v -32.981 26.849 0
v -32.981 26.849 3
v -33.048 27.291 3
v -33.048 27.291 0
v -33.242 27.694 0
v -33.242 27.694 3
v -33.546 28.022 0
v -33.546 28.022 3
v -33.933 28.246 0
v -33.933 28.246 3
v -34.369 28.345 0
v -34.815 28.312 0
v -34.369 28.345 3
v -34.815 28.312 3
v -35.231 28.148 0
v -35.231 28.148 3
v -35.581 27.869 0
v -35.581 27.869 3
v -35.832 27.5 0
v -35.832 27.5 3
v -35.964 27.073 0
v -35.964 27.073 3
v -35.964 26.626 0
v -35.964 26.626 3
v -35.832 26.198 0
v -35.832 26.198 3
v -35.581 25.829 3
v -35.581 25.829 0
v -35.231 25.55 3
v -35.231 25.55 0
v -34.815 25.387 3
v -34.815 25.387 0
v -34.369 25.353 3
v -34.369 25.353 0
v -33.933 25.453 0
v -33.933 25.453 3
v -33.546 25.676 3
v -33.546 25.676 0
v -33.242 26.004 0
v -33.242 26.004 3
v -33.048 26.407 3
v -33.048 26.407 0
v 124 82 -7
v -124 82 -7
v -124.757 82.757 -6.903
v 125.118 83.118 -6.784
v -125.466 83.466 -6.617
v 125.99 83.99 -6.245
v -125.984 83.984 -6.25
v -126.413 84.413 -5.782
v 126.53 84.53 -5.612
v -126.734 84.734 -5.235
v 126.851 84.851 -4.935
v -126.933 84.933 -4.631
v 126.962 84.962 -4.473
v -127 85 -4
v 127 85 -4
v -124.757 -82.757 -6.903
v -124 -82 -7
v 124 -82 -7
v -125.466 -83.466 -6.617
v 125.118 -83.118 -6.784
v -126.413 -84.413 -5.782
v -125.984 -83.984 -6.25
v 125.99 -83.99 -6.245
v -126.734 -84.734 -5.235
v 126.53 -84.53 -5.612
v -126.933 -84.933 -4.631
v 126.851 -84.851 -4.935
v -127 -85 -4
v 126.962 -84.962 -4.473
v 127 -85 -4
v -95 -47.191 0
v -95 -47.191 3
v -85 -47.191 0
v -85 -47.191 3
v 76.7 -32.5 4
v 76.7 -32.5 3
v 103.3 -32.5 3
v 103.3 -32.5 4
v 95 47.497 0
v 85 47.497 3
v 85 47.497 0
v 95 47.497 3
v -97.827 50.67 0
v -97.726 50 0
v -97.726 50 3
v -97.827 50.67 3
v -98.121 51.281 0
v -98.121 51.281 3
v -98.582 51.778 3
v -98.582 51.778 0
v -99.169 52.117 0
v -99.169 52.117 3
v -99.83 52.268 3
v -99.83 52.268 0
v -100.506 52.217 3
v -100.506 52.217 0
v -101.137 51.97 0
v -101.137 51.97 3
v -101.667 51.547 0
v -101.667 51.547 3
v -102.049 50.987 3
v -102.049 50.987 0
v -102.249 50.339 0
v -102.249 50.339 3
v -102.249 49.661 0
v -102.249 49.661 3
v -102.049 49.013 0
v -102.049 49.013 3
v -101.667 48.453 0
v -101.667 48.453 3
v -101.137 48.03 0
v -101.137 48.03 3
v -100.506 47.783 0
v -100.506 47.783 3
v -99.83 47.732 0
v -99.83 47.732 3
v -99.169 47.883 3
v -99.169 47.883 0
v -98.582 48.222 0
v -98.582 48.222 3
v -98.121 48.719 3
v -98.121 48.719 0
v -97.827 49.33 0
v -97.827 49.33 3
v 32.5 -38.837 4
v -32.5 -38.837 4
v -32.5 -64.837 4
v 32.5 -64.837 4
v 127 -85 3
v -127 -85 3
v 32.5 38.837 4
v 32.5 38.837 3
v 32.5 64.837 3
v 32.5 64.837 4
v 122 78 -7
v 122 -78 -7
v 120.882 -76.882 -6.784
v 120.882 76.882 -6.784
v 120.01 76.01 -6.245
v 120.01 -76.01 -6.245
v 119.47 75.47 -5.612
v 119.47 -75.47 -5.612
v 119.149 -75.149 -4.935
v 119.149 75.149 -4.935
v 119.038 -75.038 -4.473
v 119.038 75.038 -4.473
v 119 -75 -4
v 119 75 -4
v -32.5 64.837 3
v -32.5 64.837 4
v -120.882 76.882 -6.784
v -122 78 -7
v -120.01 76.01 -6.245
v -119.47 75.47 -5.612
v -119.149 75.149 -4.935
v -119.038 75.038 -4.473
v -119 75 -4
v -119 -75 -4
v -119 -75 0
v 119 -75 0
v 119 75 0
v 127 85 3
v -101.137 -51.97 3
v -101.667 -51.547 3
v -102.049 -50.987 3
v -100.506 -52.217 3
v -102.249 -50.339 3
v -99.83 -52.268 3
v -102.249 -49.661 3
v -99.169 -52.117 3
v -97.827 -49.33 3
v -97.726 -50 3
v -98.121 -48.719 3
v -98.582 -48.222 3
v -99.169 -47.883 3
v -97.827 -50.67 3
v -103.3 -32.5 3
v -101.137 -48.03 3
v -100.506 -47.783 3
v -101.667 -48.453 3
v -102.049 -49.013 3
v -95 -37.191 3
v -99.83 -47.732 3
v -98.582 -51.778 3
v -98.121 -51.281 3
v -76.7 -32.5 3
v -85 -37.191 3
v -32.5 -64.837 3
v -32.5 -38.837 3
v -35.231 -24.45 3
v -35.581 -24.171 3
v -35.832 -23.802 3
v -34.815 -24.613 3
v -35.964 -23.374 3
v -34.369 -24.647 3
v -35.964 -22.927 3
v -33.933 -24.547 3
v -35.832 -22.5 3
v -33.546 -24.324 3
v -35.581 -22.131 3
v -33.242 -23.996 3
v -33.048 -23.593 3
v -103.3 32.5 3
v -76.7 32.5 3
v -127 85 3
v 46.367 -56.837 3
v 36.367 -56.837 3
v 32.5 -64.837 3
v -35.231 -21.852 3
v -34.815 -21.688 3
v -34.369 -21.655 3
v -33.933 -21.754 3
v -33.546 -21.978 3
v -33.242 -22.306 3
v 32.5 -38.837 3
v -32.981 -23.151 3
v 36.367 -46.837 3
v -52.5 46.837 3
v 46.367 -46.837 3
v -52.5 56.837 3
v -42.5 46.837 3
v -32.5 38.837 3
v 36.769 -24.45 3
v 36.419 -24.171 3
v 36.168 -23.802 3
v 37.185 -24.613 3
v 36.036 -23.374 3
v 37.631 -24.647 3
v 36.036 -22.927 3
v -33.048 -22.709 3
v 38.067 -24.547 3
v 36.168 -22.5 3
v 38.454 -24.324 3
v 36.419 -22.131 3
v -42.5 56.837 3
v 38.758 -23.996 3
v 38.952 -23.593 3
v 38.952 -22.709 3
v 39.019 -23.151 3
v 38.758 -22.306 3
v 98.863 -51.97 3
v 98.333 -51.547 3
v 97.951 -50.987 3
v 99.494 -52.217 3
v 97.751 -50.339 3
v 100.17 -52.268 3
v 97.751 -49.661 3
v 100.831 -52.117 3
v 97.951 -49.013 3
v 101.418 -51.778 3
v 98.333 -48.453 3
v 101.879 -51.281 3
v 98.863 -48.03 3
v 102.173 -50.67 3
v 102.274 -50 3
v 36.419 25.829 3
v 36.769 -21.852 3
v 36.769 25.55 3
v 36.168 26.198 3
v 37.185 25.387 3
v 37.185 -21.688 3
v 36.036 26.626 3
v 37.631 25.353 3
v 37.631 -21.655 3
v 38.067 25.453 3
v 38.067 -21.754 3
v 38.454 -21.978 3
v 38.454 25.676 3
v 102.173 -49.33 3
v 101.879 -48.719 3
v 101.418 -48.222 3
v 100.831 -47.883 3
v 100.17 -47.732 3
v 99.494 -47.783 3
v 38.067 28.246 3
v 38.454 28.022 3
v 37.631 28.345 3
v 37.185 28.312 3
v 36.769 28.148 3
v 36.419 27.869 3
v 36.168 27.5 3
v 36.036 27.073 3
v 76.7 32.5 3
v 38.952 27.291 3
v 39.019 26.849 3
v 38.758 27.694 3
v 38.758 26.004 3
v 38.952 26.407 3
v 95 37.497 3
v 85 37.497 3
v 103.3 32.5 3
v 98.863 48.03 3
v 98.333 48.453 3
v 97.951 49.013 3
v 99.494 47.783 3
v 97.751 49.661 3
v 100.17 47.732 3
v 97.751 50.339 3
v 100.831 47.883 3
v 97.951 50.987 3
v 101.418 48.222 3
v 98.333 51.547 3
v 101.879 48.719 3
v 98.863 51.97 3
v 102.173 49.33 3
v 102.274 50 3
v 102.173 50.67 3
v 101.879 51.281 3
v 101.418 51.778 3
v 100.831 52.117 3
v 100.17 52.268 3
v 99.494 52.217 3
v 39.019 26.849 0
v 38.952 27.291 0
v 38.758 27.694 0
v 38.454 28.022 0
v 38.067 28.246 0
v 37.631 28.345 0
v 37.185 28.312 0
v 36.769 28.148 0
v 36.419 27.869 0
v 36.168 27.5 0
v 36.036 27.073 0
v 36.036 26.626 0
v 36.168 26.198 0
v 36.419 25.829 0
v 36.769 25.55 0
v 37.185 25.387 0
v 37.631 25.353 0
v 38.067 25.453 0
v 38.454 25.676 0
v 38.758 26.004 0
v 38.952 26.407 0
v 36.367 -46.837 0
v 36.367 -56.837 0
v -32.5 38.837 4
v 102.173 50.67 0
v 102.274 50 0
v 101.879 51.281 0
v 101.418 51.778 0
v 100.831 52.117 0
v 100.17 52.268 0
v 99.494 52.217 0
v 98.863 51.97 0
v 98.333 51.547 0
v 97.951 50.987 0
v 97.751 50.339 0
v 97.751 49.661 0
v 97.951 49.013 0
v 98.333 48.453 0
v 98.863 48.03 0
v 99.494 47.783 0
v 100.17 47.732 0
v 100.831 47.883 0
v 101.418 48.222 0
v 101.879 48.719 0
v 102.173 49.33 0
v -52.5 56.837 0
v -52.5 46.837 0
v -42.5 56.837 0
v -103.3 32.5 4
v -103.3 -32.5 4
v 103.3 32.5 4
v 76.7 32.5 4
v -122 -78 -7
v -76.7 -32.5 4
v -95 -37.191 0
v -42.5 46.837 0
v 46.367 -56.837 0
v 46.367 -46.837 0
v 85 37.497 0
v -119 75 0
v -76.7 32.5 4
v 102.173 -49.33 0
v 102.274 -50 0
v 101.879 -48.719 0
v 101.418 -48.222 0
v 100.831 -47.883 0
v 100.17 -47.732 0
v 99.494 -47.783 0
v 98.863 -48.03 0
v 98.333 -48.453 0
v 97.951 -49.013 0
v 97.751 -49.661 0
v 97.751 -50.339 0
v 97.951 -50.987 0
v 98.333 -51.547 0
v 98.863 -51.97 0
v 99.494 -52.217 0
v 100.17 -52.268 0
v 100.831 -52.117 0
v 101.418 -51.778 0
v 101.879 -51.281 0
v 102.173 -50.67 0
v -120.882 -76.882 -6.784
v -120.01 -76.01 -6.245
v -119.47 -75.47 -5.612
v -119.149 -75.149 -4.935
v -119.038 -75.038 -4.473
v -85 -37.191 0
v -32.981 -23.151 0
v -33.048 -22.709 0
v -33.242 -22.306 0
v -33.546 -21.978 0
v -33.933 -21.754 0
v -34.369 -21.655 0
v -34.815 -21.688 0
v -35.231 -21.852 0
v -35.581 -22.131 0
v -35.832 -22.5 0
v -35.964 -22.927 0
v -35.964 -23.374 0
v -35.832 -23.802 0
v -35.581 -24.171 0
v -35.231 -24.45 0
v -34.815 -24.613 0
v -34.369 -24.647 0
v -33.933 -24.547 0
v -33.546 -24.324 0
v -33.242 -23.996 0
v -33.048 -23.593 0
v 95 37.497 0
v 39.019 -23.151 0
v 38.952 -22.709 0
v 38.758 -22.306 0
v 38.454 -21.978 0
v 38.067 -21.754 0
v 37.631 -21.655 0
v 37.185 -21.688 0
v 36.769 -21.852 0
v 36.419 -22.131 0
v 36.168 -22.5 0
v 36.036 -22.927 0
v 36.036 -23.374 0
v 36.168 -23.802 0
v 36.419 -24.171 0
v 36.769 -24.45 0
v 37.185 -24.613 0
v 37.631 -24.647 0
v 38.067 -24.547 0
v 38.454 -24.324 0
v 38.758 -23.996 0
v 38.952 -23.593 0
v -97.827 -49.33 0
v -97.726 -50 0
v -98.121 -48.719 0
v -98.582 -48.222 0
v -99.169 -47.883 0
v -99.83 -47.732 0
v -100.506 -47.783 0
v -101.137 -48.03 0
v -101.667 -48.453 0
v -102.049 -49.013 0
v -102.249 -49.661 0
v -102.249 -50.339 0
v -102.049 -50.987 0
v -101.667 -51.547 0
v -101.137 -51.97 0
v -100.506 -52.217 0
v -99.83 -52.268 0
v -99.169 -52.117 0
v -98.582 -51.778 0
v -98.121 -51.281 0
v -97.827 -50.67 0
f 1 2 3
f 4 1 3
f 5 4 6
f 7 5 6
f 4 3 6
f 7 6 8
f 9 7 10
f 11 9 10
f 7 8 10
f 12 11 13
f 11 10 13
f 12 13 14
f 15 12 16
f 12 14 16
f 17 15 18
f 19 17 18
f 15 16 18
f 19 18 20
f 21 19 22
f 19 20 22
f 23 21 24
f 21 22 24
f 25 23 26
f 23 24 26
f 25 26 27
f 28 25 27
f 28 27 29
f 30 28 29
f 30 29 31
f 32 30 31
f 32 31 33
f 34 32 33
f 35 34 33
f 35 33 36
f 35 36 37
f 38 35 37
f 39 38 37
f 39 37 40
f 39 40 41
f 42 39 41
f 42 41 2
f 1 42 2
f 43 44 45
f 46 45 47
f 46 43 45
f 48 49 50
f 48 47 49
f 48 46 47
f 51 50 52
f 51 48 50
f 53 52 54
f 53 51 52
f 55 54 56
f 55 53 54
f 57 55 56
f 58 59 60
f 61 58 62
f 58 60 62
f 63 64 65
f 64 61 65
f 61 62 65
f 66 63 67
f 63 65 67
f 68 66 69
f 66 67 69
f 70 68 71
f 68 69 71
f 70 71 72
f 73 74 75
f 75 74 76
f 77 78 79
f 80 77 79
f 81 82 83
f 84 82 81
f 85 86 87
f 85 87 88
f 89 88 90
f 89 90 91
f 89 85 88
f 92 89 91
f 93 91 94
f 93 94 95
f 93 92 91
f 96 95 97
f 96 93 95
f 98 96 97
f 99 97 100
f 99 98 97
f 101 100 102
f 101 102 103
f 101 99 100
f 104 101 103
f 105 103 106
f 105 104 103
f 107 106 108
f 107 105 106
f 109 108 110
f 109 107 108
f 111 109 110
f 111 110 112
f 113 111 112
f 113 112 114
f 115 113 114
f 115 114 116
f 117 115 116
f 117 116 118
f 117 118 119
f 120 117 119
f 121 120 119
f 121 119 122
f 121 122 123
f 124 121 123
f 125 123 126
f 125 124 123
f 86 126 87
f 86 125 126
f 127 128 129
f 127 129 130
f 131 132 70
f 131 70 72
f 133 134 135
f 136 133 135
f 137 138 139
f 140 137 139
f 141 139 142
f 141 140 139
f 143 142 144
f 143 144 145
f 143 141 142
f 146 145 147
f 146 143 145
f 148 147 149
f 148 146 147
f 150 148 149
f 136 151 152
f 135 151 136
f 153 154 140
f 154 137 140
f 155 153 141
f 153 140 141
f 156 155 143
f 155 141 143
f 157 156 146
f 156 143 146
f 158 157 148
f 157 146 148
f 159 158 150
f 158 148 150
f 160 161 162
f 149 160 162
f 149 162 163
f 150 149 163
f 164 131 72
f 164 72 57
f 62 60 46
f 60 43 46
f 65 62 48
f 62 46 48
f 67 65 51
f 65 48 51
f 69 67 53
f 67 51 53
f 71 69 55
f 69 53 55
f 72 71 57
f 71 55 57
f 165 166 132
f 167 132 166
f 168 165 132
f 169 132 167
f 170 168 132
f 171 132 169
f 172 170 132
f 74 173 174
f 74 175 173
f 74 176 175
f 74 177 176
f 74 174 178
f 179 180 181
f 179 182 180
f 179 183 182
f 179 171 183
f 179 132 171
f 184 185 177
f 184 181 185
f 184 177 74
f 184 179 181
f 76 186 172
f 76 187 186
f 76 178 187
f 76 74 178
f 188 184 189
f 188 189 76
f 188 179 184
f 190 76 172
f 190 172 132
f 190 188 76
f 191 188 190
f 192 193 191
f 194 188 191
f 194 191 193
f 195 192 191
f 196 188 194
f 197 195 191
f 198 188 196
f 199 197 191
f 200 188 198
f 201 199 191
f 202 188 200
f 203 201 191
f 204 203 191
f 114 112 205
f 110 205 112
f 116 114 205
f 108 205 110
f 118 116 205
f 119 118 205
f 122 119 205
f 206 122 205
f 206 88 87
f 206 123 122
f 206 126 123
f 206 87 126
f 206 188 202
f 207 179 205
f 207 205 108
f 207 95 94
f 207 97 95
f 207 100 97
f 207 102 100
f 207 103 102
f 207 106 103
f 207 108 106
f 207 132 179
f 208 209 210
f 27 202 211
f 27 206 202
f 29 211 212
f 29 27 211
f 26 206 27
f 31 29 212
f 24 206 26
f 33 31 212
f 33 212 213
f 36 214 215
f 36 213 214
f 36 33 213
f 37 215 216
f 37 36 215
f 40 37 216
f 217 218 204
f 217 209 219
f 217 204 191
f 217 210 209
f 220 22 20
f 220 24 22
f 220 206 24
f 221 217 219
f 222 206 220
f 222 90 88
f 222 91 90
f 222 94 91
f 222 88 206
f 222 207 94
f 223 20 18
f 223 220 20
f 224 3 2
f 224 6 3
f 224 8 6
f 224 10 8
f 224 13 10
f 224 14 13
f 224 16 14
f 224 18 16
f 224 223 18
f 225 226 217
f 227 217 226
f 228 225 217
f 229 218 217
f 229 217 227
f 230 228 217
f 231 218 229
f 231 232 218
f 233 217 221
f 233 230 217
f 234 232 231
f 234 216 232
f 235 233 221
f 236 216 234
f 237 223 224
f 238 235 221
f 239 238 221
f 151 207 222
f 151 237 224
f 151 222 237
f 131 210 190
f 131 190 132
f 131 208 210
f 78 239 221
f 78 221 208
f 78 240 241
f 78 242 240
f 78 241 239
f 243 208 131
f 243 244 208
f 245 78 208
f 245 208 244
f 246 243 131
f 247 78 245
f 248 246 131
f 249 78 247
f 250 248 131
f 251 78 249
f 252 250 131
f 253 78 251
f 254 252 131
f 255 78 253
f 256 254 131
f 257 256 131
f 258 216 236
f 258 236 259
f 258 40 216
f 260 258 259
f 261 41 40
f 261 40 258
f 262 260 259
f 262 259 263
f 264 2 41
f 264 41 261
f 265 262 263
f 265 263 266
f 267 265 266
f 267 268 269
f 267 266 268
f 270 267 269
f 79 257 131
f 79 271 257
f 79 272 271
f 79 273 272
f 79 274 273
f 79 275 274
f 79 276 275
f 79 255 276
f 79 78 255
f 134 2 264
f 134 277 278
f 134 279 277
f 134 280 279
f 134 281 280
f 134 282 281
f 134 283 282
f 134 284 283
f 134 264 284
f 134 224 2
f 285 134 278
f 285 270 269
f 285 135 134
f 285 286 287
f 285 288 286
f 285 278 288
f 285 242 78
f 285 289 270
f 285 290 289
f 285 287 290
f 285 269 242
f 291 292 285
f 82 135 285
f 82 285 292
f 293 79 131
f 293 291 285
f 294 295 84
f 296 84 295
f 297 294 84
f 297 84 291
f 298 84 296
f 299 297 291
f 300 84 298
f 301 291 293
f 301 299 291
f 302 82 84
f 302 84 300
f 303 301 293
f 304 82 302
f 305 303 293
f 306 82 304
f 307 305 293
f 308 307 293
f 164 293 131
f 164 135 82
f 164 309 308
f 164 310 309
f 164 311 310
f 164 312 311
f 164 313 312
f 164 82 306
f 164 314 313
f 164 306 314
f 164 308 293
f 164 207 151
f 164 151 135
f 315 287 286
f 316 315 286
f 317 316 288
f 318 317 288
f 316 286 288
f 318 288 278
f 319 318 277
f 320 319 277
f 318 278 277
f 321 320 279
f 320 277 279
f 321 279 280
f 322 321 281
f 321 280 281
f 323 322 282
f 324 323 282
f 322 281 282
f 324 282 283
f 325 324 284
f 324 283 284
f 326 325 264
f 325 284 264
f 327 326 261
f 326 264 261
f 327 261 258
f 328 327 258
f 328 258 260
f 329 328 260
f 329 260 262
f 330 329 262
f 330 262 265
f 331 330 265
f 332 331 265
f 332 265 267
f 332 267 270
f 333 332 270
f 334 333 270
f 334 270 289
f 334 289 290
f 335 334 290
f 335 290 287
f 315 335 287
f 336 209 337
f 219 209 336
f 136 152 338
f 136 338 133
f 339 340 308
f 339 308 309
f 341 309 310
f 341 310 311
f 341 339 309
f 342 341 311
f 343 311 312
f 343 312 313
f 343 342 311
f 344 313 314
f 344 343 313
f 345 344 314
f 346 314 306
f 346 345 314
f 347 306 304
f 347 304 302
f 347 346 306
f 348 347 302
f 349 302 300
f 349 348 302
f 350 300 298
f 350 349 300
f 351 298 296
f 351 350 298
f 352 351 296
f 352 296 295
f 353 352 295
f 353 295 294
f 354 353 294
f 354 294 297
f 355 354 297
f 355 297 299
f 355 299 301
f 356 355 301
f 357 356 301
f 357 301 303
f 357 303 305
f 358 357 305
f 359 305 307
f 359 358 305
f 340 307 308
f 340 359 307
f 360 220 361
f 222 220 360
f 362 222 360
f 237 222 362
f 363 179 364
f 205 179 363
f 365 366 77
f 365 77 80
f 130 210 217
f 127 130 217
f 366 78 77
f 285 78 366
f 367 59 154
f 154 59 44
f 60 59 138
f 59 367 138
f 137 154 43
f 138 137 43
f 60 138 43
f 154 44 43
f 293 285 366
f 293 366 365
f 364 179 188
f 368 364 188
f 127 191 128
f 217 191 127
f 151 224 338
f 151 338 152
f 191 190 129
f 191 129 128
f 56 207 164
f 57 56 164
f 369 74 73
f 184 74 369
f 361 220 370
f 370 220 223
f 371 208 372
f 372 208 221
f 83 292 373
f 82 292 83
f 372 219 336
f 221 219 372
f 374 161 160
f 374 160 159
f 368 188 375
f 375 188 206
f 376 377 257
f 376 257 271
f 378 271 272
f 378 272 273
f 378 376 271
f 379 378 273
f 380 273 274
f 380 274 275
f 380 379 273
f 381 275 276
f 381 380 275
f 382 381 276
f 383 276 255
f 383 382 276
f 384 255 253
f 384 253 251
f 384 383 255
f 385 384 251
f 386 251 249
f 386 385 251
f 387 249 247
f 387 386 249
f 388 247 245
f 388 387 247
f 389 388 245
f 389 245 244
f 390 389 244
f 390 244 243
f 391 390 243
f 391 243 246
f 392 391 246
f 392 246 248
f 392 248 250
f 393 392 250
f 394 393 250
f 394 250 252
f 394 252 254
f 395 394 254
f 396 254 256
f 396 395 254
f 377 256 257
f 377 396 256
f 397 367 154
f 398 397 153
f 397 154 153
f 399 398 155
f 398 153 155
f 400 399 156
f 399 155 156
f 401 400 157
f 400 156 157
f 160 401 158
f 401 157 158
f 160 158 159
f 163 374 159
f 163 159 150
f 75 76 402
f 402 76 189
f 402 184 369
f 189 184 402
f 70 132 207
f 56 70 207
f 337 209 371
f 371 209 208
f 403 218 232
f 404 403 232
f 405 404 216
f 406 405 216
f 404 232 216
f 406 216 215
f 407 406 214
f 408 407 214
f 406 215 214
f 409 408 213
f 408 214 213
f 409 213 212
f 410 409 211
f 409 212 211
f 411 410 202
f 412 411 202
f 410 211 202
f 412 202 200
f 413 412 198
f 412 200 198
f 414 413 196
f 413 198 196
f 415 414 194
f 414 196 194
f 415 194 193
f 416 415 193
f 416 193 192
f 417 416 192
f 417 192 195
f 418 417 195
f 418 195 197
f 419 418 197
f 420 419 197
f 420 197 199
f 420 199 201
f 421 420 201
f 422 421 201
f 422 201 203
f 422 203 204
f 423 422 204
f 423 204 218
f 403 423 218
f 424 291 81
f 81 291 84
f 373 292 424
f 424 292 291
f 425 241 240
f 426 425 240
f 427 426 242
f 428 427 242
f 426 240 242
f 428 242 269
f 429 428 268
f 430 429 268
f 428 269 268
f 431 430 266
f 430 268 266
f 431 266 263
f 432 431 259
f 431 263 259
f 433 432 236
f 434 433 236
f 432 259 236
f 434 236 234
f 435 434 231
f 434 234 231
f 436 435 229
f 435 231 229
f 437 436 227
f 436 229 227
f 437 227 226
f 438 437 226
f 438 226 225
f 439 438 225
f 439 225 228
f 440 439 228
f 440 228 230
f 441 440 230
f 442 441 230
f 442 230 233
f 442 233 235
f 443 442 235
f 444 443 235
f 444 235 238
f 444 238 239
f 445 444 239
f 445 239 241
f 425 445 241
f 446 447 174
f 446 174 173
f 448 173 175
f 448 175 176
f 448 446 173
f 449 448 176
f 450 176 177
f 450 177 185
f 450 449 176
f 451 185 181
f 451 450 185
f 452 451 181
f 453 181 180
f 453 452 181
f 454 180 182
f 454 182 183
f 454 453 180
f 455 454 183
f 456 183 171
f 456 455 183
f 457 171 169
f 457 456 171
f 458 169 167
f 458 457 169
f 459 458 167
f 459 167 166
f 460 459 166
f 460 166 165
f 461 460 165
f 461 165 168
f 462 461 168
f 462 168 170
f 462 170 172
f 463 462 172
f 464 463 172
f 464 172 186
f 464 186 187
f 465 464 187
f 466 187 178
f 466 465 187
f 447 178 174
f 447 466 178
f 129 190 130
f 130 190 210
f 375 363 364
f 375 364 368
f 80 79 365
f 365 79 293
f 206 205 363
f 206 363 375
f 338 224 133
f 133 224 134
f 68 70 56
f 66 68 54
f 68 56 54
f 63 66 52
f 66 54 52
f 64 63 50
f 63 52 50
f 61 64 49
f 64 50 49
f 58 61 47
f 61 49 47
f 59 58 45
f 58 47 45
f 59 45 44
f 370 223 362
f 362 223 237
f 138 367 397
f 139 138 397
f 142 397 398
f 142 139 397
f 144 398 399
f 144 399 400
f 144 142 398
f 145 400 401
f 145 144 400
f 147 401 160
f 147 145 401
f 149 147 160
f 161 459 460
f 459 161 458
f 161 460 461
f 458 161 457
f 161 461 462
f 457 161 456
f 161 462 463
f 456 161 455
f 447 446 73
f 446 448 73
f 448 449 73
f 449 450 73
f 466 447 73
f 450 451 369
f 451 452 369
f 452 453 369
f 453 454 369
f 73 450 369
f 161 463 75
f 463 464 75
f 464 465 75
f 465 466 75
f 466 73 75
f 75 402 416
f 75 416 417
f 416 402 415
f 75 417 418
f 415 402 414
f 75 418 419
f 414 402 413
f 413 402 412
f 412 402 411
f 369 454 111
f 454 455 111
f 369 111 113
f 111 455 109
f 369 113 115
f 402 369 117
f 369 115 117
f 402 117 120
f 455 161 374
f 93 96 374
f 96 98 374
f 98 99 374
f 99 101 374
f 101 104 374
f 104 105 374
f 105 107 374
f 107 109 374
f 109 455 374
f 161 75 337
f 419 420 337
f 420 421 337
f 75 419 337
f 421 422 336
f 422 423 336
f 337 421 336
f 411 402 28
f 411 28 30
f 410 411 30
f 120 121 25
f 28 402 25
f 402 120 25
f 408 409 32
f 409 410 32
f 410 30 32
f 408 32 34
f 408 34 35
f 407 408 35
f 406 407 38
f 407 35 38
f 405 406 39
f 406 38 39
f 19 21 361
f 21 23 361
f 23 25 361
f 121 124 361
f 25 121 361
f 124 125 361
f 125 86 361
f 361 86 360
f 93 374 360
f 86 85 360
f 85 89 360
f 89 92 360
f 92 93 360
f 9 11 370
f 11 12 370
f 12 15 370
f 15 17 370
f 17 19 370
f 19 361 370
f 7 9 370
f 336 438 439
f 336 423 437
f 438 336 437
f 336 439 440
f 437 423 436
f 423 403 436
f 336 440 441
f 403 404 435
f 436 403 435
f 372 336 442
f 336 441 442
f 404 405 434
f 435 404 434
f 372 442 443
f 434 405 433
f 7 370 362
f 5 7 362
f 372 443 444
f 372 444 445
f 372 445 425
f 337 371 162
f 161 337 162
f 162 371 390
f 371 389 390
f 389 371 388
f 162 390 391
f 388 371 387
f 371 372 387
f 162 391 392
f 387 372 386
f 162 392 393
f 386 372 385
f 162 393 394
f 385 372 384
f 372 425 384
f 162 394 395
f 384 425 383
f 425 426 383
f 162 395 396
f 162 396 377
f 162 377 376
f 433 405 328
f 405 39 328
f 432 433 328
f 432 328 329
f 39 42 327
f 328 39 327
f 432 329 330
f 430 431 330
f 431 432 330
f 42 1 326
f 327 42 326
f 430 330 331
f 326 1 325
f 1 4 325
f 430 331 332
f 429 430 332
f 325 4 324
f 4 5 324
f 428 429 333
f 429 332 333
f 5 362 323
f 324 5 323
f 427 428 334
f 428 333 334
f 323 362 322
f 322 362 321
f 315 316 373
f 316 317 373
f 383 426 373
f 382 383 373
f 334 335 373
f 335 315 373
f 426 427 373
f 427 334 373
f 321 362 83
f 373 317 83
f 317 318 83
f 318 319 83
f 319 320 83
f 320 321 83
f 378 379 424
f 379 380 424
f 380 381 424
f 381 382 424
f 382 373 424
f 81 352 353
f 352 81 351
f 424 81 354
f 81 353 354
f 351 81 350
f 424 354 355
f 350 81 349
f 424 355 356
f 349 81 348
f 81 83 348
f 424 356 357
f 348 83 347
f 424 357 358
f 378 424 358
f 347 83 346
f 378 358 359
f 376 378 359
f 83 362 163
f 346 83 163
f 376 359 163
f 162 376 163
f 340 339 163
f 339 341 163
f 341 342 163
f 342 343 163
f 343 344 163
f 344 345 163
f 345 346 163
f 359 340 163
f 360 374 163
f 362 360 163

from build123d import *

# Parameters (mm, degrees)
F0_W      = 254
F0_H      = 170
F0_R      = 2.2742272187
F1_DEPTH  = 3
F2_W      = 254
F2_H      = 170
F2_W_2    = 238
F2_H_2    = 150
F3_DEPTH  = 10
F4_R      = 3
F5_R      = 1.5
F6_DEPTH  = 25
F7_W      = 26.6
F7_H      = 65
F7_W_2    = 65
F7_H_2    = 26
F8_DEPTH  = 1
F9_W      = 10
F9_H      = 10
F10_DEPTH = 25


# Not quite as in the source:
# - a feature names something its author has since deleted; it is built from what else it names


with BuildPart() as f1:
    # F0 (on Top) → F1 (new body)
    with BuildSketch(Plane.XY):
        Rectangle(F0_W, F0_H)
        with Locations((-100, -50)):
            Circle(F0_R, mode=Mode.SUBTRACT)
        with Locations((100, -50)):
            Circle(F0_R, mode=Mode.SUBTRACT)
        with Locations((-100, 50)):
            Circle(F0_R, mode=Mode.SUBTRACT)
        with Locations((100, 50)):
            Circle(F0_R, mode=Mode.SUBTRACT)
    extrude(amount=F1_DEPTH)

    # F2 (on face) → F3 (join)
    with BuildSketch(Plane.XY.offset(3)):
        Rectangle(F2_W, F2_H)
        Rectangle(F2_W_2, F2_H_2, mode=Mode.SUBTRACT)
    extrude(amount=-F3_DEPTH)

    # F4
    f4_edges = [f1.edges().sort_by_distance(p)[0] for p in [
        (-127, 0, -7),
        (-119, 0, -7),
        (0, 75, -7),
        (0, 85, -7),
        (119, 0, -7),
        (127, 0, -7),
        (0, -75, -7),
        (0, -85, -7),
    ]]
    fillet(f4_edges, radius=F4_R)

    # F5 (on face) → F6 (cut)
    with BuildSketch(Plane.XY.offset(3)):
        with Locations((-34.4810113311, -23.1507848948)):
            Circle(F5_R)
        with Locations((-34.4810113311, 26.8492151052)):
            Circle(F5_R)
        with Locations((37.5189886689, -23.1507848948)):
            Circle(F5_R)
        with Locations((37.5189886689, 26.8492151052)):
            Circle(F5_R)
    extrude(amount=-F6_DEPTH, mode=Mode.SUBTRACT)

    # F7 (on face) → F8 (join)
    with BuildSketch(Plane.XY.offset(3)):
        with Locations((-90, 0)):
            Rectangle(F7_W, F7_H)
        with Locations((0, 51.8365384532)):
            Rectangle(F7_W_2, F7_H_2)
        with Locations((0, -51.8365384532)):
            Rectangle(F7_W_2, F7_H_2)
        with Locations((90, 0)):
            Rectangle(F7_W, F7_H)
    extrude(amount=F8_DEPTH)

    # F9 (on face) → F10 (cut)
    with BuildSketch(Plane.XY.offset(3)):
        with Locations((-47.5, 51.8365384532)):
            Rectangle(F9_W, F9_H)
        with Locations((90, 42.4970947206)):
            Rectangle(F9_W, F9_H)
        with Locations((41.3667224348, -51.8365384532)):
            Rectangle(F9_W, F9_H)
        with Locations((-90, -42.1905592084)):
            Rectangle(F9_W, F9_H)
    extrude(amount=-F10_DEPTH, mode=Mode.SUBTRACT)


solid = f1.part
